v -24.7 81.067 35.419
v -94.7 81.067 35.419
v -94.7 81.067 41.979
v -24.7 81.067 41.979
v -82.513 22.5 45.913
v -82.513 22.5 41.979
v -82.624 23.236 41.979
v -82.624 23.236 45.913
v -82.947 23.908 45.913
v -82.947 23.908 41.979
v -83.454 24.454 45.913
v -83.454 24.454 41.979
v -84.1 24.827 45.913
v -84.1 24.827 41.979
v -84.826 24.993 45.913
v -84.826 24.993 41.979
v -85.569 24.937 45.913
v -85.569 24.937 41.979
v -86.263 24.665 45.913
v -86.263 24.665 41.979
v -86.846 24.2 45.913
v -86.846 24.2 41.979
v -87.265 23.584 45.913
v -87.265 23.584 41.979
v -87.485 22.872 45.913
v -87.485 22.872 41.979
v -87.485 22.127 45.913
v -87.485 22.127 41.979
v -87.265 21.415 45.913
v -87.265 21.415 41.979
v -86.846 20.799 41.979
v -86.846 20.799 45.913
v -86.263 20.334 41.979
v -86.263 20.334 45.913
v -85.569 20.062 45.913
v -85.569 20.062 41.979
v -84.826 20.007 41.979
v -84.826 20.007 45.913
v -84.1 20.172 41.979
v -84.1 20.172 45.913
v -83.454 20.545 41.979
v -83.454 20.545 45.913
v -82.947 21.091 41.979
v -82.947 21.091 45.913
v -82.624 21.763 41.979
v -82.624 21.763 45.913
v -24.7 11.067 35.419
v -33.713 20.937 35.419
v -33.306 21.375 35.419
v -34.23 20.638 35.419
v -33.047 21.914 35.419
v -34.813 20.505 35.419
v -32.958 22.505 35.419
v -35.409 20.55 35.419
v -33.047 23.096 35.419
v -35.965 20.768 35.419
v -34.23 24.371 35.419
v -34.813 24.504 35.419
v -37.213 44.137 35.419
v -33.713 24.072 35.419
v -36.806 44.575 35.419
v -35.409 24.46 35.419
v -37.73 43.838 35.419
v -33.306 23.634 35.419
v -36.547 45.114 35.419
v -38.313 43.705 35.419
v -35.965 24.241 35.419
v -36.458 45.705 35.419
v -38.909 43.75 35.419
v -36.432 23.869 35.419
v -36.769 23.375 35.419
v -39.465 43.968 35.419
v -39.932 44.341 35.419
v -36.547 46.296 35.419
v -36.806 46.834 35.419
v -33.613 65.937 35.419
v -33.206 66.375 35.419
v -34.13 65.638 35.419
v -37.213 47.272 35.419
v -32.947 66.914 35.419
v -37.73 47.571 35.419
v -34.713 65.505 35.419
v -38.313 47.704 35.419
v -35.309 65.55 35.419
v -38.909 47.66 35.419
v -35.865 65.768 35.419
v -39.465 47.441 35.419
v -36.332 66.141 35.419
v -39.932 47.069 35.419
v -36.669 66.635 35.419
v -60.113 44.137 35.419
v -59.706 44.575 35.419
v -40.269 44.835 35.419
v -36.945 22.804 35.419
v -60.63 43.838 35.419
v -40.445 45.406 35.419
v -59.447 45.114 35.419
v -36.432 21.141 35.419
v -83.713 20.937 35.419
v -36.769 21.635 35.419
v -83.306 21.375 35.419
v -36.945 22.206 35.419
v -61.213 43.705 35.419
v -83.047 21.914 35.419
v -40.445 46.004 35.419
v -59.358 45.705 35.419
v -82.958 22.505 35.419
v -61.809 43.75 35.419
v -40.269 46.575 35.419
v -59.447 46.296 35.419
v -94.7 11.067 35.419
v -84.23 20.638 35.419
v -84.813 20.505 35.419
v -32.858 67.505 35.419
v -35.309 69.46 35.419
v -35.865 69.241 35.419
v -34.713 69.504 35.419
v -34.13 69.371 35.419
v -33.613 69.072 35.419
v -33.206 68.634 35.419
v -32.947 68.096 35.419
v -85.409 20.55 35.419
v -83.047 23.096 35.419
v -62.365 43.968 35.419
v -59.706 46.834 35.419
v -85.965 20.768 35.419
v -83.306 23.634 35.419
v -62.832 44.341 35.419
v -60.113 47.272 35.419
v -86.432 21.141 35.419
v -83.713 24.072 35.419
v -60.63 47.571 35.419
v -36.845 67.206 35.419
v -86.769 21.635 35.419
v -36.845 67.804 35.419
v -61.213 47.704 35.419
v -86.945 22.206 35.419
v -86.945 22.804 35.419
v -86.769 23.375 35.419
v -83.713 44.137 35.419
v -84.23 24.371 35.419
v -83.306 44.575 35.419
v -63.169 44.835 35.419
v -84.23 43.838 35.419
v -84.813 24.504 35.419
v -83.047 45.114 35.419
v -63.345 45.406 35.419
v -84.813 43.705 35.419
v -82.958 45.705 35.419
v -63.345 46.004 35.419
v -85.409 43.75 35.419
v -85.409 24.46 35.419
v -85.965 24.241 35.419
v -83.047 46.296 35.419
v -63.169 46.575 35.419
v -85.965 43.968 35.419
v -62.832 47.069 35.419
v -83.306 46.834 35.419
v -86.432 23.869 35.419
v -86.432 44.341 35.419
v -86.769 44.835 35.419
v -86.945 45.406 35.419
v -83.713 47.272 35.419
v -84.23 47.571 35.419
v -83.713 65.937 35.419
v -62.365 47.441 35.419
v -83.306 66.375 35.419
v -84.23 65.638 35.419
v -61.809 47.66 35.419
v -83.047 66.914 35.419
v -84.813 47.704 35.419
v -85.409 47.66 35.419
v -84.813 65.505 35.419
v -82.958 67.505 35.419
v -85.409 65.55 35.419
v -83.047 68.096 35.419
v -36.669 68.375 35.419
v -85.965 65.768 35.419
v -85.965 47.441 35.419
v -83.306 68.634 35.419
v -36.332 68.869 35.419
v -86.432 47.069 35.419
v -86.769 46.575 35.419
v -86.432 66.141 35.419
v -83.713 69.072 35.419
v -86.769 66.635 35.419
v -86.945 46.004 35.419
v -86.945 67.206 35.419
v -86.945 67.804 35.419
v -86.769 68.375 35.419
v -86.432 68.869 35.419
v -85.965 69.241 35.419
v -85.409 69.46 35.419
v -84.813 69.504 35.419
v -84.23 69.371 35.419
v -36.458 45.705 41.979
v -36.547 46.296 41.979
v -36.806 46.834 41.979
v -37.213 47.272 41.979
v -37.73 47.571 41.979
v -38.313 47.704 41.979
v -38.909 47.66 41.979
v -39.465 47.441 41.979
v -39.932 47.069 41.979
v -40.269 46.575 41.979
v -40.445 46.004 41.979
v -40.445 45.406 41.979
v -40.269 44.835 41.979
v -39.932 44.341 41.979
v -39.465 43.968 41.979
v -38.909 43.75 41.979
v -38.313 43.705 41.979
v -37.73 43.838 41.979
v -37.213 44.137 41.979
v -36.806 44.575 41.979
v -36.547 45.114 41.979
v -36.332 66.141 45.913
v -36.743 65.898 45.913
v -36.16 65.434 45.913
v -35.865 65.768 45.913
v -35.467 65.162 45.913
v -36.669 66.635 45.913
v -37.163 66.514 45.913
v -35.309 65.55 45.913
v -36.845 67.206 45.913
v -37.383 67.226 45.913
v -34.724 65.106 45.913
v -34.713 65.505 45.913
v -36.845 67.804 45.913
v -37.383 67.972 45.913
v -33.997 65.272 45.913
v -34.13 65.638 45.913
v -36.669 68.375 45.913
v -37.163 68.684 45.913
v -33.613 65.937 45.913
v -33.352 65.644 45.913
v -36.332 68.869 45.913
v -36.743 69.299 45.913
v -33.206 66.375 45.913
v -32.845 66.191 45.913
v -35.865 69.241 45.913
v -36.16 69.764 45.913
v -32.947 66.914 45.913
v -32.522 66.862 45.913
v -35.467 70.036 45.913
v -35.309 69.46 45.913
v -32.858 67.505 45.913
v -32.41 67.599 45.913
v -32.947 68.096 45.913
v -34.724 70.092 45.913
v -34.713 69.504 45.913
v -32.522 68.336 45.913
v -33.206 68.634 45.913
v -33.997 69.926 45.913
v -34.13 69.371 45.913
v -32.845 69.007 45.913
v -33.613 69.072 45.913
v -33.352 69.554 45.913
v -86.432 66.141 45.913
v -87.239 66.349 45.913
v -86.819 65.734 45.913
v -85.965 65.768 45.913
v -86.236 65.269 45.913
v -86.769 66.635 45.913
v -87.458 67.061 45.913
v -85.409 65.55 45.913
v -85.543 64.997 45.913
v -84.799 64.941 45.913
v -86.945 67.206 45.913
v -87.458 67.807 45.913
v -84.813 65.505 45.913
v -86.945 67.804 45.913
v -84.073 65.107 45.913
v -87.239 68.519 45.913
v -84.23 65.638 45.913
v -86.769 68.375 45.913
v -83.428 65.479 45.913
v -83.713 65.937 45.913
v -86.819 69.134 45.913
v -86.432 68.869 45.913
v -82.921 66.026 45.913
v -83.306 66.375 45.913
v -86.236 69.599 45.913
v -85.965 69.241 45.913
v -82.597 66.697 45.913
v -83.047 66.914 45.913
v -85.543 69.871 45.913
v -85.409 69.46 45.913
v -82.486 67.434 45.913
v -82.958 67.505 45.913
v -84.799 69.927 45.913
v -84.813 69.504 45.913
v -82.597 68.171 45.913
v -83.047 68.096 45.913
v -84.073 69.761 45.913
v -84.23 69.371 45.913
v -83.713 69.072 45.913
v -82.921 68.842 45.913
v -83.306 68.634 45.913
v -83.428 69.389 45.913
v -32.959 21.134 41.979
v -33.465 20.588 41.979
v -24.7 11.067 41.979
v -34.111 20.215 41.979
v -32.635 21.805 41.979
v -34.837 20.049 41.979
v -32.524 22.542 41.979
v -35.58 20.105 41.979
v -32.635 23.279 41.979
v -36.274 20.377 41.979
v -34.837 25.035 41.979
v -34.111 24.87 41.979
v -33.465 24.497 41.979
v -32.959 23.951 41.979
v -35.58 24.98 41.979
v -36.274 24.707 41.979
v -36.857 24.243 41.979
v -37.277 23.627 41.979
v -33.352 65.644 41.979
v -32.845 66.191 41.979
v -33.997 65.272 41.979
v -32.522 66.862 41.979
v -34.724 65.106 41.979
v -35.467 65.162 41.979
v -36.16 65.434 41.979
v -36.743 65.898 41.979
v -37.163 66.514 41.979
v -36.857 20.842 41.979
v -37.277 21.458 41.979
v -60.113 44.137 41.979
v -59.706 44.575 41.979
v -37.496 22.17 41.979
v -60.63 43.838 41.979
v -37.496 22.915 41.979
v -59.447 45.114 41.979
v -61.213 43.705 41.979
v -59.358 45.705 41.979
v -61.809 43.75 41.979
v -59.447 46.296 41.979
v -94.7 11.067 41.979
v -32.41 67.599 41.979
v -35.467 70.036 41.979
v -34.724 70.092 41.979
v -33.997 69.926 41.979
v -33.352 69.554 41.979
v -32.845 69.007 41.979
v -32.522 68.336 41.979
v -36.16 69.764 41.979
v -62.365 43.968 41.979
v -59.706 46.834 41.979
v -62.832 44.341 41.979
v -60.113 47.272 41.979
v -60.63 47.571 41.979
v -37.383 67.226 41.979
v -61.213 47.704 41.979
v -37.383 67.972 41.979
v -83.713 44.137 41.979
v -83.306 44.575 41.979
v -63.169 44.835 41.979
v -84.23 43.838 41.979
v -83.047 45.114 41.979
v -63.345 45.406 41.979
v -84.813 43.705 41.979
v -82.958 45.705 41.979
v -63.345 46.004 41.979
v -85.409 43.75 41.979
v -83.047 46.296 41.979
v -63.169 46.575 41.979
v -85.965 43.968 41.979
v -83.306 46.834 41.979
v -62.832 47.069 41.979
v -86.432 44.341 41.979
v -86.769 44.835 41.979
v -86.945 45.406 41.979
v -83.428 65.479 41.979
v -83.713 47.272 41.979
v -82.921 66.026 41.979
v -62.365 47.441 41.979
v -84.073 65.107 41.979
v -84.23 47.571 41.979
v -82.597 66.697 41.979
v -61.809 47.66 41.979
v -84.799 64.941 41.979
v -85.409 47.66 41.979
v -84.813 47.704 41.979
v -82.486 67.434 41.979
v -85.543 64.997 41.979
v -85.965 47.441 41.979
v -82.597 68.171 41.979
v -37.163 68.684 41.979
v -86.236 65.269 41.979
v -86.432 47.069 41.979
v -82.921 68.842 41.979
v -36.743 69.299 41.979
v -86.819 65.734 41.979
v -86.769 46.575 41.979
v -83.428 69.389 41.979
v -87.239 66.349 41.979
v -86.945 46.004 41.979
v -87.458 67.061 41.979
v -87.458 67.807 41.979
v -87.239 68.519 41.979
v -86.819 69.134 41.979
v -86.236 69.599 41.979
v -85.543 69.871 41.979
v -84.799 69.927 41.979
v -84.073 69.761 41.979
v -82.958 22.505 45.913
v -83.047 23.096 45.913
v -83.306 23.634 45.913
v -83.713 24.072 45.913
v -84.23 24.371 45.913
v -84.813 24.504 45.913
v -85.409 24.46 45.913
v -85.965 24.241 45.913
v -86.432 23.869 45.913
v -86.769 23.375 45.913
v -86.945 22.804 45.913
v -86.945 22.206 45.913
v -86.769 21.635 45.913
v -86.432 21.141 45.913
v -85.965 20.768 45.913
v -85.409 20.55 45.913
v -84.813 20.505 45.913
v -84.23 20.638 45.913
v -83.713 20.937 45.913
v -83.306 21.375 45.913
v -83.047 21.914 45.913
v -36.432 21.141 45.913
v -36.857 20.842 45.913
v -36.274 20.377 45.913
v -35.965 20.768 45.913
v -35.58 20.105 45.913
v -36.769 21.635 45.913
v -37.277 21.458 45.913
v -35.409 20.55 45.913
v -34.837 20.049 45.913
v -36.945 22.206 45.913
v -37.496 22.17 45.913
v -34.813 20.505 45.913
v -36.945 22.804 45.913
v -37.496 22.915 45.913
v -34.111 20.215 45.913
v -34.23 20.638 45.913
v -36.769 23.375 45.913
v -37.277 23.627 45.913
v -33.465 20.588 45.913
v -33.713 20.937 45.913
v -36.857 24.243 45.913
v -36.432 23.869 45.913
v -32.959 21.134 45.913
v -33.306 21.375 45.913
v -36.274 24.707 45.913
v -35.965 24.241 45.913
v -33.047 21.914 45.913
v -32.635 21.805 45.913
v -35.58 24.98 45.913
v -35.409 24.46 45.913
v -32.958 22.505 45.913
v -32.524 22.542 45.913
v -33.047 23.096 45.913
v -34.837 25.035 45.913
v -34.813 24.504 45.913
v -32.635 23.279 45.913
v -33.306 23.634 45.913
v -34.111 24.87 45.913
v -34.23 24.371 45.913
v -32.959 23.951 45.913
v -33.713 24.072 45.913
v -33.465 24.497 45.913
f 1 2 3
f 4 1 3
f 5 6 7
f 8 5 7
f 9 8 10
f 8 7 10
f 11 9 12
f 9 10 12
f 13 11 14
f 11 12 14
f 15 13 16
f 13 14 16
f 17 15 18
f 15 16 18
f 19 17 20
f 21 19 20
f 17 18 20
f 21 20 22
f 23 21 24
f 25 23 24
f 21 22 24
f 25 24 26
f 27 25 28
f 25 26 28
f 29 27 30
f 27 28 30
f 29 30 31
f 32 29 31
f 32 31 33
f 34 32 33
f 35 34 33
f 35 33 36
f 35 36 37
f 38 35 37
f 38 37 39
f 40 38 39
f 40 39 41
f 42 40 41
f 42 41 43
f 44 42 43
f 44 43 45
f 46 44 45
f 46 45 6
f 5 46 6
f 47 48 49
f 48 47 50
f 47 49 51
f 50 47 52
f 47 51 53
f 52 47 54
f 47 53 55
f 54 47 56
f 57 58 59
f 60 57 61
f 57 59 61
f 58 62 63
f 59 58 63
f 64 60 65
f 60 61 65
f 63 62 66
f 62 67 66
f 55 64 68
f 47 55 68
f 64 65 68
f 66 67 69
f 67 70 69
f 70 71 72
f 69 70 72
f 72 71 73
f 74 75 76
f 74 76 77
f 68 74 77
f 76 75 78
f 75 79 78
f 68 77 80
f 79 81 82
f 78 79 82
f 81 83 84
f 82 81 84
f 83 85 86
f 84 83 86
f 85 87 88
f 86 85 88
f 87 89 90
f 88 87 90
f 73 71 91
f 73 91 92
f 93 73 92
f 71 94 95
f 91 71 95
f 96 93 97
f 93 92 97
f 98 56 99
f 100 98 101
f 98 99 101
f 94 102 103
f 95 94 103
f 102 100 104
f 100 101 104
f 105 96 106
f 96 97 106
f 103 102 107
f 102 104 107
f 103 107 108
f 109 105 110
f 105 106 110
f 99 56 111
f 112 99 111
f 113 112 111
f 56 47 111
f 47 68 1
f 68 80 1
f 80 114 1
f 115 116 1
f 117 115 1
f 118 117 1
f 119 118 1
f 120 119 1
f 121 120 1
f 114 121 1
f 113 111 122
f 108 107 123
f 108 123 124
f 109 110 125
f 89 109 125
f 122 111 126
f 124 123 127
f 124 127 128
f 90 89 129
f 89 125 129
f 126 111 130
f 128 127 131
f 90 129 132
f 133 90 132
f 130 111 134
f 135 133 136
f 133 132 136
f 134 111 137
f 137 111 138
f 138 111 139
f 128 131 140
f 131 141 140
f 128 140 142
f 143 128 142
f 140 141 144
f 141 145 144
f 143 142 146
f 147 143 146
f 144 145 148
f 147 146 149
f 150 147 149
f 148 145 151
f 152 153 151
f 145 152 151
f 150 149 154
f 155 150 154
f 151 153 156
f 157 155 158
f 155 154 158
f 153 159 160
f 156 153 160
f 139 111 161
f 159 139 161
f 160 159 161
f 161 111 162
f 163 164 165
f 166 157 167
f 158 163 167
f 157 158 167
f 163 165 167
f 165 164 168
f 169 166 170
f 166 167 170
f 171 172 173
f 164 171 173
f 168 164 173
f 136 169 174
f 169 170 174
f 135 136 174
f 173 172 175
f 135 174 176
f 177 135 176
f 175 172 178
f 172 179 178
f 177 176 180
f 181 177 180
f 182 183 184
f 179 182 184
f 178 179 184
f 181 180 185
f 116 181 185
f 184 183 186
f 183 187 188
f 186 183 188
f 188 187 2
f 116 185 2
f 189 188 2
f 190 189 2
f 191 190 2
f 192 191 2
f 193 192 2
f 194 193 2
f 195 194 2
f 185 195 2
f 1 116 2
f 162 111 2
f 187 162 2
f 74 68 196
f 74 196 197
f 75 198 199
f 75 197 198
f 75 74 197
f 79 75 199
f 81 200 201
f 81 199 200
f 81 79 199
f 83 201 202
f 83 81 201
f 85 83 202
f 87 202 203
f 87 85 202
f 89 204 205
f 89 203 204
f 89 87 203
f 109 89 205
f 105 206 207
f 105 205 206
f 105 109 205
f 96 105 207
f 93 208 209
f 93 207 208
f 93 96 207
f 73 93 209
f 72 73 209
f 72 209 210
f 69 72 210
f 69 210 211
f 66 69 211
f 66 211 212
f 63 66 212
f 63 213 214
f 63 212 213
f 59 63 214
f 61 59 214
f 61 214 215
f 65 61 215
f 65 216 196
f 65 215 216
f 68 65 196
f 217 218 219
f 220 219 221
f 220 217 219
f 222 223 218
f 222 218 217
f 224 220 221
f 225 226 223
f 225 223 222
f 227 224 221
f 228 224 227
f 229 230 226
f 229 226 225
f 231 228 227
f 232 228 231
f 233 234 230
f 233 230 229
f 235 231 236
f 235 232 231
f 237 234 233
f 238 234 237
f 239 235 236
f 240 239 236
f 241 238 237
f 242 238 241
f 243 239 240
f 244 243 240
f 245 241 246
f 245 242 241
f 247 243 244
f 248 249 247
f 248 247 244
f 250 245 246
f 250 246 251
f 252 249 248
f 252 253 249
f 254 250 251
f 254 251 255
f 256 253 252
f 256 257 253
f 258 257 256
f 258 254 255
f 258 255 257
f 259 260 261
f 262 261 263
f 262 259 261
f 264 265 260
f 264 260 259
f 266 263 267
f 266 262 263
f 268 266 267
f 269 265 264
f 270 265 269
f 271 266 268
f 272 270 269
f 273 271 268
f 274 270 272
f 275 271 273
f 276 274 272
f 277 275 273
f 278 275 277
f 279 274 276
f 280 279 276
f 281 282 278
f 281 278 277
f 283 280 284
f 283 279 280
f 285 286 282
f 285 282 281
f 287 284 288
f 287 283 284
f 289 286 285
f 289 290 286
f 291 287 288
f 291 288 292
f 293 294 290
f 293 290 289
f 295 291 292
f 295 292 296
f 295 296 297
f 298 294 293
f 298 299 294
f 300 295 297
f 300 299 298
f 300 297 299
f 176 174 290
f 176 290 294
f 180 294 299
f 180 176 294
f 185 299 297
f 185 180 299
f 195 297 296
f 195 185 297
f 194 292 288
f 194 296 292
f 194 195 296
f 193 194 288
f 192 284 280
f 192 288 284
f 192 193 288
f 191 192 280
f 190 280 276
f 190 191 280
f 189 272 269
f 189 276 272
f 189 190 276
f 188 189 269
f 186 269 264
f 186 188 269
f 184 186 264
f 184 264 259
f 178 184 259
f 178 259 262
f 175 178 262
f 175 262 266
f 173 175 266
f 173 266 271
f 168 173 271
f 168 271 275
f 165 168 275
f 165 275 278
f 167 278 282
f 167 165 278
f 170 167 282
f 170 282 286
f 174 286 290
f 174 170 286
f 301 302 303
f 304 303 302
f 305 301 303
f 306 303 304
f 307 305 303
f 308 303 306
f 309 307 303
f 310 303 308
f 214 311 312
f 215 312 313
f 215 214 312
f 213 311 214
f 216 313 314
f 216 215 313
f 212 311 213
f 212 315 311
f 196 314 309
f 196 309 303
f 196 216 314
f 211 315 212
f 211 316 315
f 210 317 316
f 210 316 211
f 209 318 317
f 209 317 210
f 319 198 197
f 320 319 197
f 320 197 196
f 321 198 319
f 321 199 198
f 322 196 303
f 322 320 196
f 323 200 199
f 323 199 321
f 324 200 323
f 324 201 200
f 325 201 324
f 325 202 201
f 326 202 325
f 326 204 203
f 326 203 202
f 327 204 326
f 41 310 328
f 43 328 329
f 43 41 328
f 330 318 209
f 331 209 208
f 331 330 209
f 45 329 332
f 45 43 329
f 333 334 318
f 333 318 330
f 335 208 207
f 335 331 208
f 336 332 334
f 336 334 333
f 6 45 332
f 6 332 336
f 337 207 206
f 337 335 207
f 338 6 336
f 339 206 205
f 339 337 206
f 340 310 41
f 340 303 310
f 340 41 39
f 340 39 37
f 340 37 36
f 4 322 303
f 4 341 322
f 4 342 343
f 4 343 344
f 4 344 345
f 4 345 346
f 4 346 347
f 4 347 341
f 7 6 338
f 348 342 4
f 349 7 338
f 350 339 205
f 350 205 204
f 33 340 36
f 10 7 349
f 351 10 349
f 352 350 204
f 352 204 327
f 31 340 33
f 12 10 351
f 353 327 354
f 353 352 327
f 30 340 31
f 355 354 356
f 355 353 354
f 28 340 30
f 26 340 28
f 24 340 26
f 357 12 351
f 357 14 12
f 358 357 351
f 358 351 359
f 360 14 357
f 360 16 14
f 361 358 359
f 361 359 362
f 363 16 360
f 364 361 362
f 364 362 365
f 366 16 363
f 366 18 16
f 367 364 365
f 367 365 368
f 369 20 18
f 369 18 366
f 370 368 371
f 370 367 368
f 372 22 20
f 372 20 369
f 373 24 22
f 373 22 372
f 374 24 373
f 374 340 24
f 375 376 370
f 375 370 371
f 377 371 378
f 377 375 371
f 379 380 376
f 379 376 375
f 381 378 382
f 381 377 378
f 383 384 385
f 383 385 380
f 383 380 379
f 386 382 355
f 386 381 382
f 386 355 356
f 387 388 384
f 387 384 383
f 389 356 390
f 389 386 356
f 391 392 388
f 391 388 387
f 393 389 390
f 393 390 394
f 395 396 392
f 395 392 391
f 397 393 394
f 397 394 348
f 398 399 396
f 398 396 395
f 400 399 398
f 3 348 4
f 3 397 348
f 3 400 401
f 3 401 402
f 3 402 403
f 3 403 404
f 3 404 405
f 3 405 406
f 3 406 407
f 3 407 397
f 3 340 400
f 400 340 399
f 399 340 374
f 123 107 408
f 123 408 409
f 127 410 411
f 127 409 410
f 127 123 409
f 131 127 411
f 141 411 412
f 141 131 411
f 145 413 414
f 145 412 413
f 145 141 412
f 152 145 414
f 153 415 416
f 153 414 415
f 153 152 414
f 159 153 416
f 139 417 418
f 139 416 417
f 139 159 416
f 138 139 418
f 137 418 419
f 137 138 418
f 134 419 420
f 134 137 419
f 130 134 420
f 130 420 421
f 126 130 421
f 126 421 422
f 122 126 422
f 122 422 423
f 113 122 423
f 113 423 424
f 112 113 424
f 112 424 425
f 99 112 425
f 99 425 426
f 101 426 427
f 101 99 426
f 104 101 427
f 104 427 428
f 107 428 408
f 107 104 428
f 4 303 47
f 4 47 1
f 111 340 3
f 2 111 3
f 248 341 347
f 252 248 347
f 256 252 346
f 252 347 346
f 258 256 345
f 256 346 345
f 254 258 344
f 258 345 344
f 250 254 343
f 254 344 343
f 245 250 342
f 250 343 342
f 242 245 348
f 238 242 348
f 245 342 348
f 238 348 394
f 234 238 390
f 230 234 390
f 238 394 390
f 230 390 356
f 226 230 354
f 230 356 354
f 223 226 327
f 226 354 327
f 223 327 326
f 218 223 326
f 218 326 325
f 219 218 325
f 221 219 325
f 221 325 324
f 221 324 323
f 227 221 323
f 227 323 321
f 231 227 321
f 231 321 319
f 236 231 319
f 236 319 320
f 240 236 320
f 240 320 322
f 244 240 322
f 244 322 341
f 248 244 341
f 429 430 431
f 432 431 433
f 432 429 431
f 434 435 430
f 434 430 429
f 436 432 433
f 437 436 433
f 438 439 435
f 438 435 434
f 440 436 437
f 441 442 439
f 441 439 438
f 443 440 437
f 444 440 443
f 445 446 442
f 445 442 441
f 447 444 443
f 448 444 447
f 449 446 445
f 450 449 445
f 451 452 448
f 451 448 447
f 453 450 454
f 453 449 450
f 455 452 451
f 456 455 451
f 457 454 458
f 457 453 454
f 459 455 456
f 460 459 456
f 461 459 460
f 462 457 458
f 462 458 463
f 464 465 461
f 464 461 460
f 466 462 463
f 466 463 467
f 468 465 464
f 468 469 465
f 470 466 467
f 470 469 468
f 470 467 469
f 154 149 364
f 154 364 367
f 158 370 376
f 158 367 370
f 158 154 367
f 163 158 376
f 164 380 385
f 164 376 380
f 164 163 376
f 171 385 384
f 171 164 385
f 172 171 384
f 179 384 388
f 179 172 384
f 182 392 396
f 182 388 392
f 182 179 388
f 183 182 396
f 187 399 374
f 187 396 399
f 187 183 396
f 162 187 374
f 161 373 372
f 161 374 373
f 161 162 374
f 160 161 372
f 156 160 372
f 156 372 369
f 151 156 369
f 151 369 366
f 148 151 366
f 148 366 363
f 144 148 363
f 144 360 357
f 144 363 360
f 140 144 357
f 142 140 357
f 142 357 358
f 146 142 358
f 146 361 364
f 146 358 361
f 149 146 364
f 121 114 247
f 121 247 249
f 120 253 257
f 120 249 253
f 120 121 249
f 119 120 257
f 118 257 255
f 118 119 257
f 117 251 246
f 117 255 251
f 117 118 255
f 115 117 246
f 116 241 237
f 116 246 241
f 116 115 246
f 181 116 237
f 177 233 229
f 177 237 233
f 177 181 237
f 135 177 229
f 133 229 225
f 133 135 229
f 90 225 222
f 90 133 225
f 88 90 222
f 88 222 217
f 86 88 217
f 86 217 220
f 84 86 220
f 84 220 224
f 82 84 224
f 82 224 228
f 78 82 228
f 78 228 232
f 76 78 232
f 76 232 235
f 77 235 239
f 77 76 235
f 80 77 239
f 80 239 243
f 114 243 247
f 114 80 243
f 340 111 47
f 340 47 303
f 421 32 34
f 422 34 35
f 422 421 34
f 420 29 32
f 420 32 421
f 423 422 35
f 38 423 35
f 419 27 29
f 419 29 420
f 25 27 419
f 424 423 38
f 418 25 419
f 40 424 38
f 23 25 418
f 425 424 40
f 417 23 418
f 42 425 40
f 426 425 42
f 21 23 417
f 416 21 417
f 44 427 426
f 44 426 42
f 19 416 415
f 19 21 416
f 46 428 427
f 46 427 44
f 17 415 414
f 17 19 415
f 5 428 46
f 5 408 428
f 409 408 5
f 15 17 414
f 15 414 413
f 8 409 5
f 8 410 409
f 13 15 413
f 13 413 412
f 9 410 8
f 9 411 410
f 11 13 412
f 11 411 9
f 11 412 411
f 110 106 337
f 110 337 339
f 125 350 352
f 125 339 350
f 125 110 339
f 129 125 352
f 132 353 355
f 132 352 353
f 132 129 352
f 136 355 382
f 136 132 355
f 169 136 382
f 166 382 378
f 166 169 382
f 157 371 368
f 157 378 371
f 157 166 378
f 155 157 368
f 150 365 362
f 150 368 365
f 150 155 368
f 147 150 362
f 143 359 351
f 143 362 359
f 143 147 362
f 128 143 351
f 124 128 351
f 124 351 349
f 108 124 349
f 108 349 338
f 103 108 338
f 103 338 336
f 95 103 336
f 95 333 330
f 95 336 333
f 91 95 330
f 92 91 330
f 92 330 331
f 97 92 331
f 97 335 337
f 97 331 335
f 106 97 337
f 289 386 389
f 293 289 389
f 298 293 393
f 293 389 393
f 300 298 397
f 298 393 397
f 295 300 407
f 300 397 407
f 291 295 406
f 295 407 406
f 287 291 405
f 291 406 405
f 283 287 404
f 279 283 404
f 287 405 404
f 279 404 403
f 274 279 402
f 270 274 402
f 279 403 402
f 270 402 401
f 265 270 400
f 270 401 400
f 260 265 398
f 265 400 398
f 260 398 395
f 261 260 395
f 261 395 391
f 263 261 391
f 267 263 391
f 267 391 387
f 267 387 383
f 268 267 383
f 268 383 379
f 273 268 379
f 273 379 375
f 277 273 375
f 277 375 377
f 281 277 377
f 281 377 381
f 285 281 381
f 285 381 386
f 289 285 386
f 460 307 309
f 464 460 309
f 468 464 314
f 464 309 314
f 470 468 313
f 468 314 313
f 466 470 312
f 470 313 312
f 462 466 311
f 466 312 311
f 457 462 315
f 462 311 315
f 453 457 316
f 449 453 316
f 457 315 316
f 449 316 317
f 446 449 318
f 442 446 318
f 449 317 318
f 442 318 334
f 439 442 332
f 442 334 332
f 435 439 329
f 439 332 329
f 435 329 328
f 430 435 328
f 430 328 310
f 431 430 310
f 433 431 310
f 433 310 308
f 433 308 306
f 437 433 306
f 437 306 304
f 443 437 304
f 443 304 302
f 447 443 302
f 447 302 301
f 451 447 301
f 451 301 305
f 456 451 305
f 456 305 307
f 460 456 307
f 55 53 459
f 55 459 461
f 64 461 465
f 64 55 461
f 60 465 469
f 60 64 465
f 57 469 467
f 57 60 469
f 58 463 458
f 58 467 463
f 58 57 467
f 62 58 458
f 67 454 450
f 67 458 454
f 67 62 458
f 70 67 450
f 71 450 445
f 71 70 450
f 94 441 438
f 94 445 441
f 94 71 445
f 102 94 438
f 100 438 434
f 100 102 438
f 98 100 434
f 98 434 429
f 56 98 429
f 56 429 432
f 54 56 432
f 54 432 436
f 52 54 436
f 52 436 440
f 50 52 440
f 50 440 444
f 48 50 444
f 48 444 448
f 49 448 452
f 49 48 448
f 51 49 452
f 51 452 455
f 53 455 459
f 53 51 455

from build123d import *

# Parameters (mm, degrees)
SKETCH016_R      = 2.005
EXTRUDE074_DEPTH = 20
EXTRUDE073_DEPTH = 20
EXTRUDE072_DEPTH = 20
EXTRUDE071_DEPTH = 20
EXTRUDE070_DEPTH = 20
EXTRUDE069_DEPTH = 20
EXTRUDE068_DEPTH = 20
SKETCH015_R      = 2.5
EXTRUDE067_DEPTH = 8
SKETCH060_W      = 70
SKETCH060_H      = 6.56
EXTRUDE066_DEPTH = 70


with BuildPart() as tornillo015:
    # Sketch016 (on Face16 of Fusion001) → Extrude074 (new body)
    with BuildSketch(Plane.XY.offset(45.913223)):
        with Locations((-84.962639, 67.504814)):
            Circle(SKETCH016_R)
    extrude(amount=EXTRUDE074_DEPTH)


with BuildPart() as tornillo015_1:
    # Extrude074 placement: moved
    add(tornillo015.part.moved(Location((46.5, -21.8, -20.5))))


with BuildPart() as tornillo014:
    # Sketch016 (on Face16 of Fusion001) → Extrude073 (new body)
    with BuildSketch(Plane.XY.offset(45.913223)):
        with Locations((-84.962639, 67.504814)):
            Circle(SKETCH016_R)
    extrude(amount=EXTRUDE073_DEPTH)


with BuildPart() as tornillo014_1:
    # Extrude073 placement: moved
    add(tornillo014.part.moved(Location((23.6, -21.8, -20.6))))


with BuildPart() as tornillo013:
    # Sketch016 (on Face16 of Fusion001) → Extrude072 (new body)
    with BuildSketch(Plane.XY.offset(45.913223)):
        with Locations((-84.962639, 67.504814)):
            Circle(SKETCH016_R)
    extrude(amount=EXTRUDE072_DEPTH)


with BuildPart() as tornillo013_1:
    # Extrude072 placement: moved
    add(tornillo013.part.moved(Location((0, -21.8, -20.8))))


with BuildPart() as tornillo012:
    # Sketch016 (on Face16 of Fusion001) → Extrude071 (new body)
    with BuildSketch(Plane.XY.offset(45.913223)):
        with Locations((-84.962639, 67.504814)):
            Circle(SKETCH016_R)
    extrude(amount=EXTRUDE071_DEPTH)


with BuildPart() as tornillo012_1:
    # Extrude071 placement: moved
    add(tornillo012.part.moved(Location((0, -45, -17))))


with BuildPart() as tornillo011:
    # Sketch016 (on Face16 of Fusion001) → Extrude070 (new body)
    with BuildSketch(Plane.XY.offset(45.913223)):
        with Locations((-84.962639, 67.504814)):
            Circle(SKETCH016_R)
    extrude(amount=EXTRUDE070_DEPTH)


with BuildPart() as tornillo011_1:
    # Extrude070 placement: moved
    add(tornillo011.part.moved(Location((50, -45, -15))))


with BuildPart() as tornillo010:
    # Sketch016 (on Face16 of Fusion001) → Extrude069 (new body)
    with BuildSketch(Plane.XY.offset(45.913223)):
        with Locations((-84.962639, 67.504814)):
            Circle(SKETCH016_R)
    extrude(amount=EXTRUDE069_DEPTH)


with BuildPart() as tornillo010_1:
    # Extrude069 placement: moved
    add(tornillo010.part.moved(Location((0, 0, -15))))


with BuildPart() as tornillo009:
    # Sketch016 (on Face16 of Fusion001) → Extrude068 (new body)
    with BuildSketch(Plane.XY.offset(45.913223)):
        with Locations((-84.962639, 67.504814)):
            Circle(SKETCH016_R)
    extrude(amount=EXTRUDE068_DEPTH)


with BuildPart() as tornillo009_1:
    # Extrude068 placement: moved
    add(tornillo009.part.moved(Location((50.1, 0, -18))))


with BuildPart() as tornillos013:
    # Sketch015 (on Face16 of Fusion) → Extrude067 (new body)
    with BuildSketch(Plane.XY.offset(41.913223)):
        with Locations((-84.986267, 67.433998)):
            Circle(SKETCH015_R)
        with Locations((-85.013062, 22.499535)):
            Circle(SKETCH015_R)
        with Locations((-35.024185, 22.542374)):
            Circle(SKETCH015_R)
        with Locations((-34.910458, 67.59893)):
            Circle(SKETCH015_R)
    extrude(amount=EXTRUDE067_DEPTH)


with BuildPart() as tornillos013_1:
    # Extrude067 placement: moved
    add(tornillos013.part.moved(Location((0, 0, -4))))


with BuildPart() as imprimir001:
    # Sketch060 → Extrude066 (new body)
    with BuildSketch(Plane.YZ):
        with Locations((4.567114, 74.199239)):
            Rectangle(SKETCH060_W, SKETCH060_H)
    extrude(amount=EXTRUDE066_DEPTH)


with BuildPart() as imprimir001_1:
    # Extrude066 placement: moved
    add(imprimir001.part.moved(Location((-94.7, 41.5, -35.5))))

    # Fusion018: union Tornillos013
    add(tornillos013_1.part)

    # Cut036: cut Tornillo009
    add(tornillo009_1.part, mode=Mode.SUBTRACT)

    # Cut037: cut Tornillo010
    add(tornillo010_1.part, mode=Mode.SUBTRACT)

    # Cut038: cut Tornillo011
    add(tornillo011_1.part, mode=Mode.SUBTRACT)

    # Cut039: cut Tornillo012
    add(tornillo012_1.part, mode=Mode.SUBTRACT)

    # Cut040: cut Tornillo013
    add(tornillo013_1.part, mode=Mode.SUBTRACT)

    # Cut041: cut Tornillo014
    add(tornillo014_1.part, mode=Mode.SUBTRACT)

    # Cut042: cut Tornillo015
    add(tornillo015_1.part, mode=Mode.SUBTRACT)


solid = imprimir001_1.part
